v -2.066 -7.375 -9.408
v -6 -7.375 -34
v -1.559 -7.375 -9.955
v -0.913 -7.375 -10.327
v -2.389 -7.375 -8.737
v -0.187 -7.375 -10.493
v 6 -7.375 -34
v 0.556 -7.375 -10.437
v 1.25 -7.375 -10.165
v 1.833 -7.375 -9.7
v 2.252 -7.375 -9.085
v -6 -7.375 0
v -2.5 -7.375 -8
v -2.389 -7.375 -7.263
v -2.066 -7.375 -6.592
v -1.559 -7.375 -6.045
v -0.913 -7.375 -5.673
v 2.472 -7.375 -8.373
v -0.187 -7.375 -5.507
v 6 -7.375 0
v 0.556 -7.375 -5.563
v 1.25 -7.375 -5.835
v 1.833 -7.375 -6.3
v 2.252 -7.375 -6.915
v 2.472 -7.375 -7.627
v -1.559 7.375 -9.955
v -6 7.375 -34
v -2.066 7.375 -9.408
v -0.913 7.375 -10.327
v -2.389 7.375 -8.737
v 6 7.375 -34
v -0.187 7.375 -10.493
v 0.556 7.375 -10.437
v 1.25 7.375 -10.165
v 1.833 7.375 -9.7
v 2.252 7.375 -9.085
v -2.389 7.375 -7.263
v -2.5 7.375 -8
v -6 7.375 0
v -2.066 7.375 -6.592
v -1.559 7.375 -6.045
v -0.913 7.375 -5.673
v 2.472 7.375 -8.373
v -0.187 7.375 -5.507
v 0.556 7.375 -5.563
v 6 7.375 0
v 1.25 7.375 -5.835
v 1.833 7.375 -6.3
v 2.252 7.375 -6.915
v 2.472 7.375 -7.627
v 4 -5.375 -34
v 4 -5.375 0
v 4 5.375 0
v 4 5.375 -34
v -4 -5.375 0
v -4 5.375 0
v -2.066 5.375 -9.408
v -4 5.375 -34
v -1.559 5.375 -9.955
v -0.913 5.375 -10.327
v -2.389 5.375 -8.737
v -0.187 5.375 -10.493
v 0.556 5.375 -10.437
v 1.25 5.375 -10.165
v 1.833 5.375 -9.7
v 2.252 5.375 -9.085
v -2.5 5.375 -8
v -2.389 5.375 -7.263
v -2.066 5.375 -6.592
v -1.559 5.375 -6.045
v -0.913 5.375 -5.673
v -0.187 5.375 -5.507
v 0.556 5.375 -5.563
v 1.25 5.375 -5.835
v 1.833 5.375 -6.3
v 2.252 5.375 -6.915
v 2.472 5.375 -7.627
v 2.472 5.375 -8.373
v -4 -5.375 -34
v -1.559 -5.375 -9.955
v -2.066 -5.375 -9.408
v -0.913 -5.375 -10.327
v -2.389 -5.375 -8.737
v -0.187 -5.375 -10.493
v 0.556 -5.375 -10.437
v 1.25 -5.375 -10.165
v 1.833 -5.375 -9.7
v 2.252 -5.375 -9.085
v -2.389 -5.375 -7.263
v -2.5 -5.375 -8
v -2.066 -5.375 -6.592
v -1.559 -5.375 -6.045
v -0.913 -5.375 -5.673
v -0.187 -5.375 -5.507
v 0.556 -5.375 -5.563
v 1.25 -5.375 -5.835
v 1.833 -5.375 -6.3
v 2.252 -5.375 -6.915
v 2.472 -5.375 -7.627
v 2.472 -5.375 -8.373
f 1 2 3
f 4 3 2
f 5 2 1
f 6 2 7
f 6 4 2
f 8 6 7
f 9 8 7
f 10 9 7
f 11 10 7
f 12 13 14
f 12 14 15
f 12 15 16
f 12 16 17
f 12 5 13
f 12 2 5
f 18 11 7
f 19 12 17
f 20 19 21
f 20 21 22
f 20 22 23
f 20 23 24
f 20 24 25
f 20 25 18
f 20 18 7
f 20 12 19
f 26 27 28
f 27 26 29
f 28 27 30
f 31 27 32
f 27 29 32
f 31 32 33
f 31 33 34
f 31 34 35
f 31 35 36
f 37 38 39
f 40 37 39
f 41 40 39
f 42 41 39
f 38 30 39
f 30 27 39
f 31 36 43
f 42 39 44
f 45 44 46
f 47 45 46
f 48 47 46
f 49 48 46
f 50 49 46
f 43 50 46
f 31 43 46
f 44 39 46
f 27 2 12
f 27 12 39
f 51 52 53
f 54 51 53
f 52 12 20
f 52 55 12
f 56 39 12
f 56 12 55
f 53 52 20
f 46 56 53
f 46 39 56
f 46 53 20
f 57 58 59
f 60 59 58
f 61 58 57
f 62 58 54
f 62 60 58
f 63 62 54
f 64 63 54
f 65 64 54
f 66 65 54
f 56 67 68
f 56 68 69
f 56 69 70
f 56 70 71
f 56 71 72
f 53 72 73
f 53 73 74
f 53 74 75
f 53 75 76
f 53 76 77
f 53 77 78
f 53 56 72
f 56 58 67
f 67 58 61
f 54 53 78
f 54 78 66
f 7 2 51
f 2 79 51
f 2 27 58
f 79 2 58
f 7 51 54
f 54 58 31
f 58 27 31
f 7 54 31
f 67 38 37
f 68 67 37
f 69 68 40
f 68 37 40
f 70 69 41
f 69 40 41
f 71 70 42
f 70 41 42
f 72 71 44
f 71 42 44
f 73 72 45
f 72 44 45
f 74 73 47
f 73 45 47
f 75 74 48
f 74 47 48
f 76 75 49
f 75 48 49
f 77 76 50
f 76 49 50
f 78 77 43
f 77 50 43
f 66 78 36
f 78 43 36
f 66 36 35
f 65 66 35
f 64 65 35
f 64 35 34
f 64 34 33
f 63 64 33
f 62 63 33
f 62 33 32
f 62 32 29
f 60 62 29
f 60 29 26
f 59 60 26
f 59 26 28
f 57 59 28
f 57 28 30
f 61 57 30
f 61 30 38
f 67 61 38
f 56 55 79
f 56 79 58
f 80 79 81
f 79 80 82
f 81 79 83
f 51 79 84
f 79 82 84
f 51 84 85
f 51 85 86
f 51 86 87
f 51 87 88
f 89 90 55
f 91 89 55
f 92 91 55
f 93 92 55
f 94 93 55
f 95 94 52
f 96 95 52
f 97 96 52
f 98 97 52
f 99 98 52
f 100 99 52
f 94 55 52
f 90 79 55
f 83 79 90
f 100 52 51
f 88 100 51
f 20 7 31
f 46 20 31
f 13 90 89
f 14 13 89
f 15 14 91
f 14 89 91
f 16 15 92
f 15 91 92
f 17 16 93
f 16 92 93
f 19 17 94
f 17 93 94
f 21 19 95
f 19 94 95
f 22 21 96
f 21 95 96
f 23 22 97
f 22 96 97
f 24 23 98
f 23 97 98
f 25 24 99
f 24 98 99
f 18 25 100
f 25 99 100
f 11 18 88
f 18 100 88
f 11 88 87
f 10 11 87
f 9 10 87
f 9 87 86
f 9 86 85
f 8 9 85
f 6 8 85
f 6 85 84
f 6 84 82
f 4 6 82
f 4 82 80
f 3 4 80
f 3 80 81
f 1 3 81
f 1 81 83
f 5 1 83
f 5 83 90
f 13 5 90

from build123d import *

# Parameters (mm, degrees)
F0_W     = 12
F0_H     = 14.75
F1_DEPTH = 34
F2_W     = 8
F2_H     = 10.75
F3_DEPTH = 36
F5_D     = 5


with BuildPart() as f1:
    # F0 (on Top) → F1 (new body)
    with BuildSketch(Plane.XY):
        Rectangle(F0_W, F0_H)
    extrude(amount=-F1_DEPTH)

    # F2 (on face) → F3 (cut)
    with BuildSketch(Plane.XY):
        Rectangle(F2_W, F2_H)
    extrude(amount=-F3_DEPTH, mode=Mode.SUBTRACT)

    # F5 (through all)
    with Locations(Plane.XZ.offset(7.375)):
        with Locations((0, -8)):
            Hole(F5_D / 2)


solid = f1.part
